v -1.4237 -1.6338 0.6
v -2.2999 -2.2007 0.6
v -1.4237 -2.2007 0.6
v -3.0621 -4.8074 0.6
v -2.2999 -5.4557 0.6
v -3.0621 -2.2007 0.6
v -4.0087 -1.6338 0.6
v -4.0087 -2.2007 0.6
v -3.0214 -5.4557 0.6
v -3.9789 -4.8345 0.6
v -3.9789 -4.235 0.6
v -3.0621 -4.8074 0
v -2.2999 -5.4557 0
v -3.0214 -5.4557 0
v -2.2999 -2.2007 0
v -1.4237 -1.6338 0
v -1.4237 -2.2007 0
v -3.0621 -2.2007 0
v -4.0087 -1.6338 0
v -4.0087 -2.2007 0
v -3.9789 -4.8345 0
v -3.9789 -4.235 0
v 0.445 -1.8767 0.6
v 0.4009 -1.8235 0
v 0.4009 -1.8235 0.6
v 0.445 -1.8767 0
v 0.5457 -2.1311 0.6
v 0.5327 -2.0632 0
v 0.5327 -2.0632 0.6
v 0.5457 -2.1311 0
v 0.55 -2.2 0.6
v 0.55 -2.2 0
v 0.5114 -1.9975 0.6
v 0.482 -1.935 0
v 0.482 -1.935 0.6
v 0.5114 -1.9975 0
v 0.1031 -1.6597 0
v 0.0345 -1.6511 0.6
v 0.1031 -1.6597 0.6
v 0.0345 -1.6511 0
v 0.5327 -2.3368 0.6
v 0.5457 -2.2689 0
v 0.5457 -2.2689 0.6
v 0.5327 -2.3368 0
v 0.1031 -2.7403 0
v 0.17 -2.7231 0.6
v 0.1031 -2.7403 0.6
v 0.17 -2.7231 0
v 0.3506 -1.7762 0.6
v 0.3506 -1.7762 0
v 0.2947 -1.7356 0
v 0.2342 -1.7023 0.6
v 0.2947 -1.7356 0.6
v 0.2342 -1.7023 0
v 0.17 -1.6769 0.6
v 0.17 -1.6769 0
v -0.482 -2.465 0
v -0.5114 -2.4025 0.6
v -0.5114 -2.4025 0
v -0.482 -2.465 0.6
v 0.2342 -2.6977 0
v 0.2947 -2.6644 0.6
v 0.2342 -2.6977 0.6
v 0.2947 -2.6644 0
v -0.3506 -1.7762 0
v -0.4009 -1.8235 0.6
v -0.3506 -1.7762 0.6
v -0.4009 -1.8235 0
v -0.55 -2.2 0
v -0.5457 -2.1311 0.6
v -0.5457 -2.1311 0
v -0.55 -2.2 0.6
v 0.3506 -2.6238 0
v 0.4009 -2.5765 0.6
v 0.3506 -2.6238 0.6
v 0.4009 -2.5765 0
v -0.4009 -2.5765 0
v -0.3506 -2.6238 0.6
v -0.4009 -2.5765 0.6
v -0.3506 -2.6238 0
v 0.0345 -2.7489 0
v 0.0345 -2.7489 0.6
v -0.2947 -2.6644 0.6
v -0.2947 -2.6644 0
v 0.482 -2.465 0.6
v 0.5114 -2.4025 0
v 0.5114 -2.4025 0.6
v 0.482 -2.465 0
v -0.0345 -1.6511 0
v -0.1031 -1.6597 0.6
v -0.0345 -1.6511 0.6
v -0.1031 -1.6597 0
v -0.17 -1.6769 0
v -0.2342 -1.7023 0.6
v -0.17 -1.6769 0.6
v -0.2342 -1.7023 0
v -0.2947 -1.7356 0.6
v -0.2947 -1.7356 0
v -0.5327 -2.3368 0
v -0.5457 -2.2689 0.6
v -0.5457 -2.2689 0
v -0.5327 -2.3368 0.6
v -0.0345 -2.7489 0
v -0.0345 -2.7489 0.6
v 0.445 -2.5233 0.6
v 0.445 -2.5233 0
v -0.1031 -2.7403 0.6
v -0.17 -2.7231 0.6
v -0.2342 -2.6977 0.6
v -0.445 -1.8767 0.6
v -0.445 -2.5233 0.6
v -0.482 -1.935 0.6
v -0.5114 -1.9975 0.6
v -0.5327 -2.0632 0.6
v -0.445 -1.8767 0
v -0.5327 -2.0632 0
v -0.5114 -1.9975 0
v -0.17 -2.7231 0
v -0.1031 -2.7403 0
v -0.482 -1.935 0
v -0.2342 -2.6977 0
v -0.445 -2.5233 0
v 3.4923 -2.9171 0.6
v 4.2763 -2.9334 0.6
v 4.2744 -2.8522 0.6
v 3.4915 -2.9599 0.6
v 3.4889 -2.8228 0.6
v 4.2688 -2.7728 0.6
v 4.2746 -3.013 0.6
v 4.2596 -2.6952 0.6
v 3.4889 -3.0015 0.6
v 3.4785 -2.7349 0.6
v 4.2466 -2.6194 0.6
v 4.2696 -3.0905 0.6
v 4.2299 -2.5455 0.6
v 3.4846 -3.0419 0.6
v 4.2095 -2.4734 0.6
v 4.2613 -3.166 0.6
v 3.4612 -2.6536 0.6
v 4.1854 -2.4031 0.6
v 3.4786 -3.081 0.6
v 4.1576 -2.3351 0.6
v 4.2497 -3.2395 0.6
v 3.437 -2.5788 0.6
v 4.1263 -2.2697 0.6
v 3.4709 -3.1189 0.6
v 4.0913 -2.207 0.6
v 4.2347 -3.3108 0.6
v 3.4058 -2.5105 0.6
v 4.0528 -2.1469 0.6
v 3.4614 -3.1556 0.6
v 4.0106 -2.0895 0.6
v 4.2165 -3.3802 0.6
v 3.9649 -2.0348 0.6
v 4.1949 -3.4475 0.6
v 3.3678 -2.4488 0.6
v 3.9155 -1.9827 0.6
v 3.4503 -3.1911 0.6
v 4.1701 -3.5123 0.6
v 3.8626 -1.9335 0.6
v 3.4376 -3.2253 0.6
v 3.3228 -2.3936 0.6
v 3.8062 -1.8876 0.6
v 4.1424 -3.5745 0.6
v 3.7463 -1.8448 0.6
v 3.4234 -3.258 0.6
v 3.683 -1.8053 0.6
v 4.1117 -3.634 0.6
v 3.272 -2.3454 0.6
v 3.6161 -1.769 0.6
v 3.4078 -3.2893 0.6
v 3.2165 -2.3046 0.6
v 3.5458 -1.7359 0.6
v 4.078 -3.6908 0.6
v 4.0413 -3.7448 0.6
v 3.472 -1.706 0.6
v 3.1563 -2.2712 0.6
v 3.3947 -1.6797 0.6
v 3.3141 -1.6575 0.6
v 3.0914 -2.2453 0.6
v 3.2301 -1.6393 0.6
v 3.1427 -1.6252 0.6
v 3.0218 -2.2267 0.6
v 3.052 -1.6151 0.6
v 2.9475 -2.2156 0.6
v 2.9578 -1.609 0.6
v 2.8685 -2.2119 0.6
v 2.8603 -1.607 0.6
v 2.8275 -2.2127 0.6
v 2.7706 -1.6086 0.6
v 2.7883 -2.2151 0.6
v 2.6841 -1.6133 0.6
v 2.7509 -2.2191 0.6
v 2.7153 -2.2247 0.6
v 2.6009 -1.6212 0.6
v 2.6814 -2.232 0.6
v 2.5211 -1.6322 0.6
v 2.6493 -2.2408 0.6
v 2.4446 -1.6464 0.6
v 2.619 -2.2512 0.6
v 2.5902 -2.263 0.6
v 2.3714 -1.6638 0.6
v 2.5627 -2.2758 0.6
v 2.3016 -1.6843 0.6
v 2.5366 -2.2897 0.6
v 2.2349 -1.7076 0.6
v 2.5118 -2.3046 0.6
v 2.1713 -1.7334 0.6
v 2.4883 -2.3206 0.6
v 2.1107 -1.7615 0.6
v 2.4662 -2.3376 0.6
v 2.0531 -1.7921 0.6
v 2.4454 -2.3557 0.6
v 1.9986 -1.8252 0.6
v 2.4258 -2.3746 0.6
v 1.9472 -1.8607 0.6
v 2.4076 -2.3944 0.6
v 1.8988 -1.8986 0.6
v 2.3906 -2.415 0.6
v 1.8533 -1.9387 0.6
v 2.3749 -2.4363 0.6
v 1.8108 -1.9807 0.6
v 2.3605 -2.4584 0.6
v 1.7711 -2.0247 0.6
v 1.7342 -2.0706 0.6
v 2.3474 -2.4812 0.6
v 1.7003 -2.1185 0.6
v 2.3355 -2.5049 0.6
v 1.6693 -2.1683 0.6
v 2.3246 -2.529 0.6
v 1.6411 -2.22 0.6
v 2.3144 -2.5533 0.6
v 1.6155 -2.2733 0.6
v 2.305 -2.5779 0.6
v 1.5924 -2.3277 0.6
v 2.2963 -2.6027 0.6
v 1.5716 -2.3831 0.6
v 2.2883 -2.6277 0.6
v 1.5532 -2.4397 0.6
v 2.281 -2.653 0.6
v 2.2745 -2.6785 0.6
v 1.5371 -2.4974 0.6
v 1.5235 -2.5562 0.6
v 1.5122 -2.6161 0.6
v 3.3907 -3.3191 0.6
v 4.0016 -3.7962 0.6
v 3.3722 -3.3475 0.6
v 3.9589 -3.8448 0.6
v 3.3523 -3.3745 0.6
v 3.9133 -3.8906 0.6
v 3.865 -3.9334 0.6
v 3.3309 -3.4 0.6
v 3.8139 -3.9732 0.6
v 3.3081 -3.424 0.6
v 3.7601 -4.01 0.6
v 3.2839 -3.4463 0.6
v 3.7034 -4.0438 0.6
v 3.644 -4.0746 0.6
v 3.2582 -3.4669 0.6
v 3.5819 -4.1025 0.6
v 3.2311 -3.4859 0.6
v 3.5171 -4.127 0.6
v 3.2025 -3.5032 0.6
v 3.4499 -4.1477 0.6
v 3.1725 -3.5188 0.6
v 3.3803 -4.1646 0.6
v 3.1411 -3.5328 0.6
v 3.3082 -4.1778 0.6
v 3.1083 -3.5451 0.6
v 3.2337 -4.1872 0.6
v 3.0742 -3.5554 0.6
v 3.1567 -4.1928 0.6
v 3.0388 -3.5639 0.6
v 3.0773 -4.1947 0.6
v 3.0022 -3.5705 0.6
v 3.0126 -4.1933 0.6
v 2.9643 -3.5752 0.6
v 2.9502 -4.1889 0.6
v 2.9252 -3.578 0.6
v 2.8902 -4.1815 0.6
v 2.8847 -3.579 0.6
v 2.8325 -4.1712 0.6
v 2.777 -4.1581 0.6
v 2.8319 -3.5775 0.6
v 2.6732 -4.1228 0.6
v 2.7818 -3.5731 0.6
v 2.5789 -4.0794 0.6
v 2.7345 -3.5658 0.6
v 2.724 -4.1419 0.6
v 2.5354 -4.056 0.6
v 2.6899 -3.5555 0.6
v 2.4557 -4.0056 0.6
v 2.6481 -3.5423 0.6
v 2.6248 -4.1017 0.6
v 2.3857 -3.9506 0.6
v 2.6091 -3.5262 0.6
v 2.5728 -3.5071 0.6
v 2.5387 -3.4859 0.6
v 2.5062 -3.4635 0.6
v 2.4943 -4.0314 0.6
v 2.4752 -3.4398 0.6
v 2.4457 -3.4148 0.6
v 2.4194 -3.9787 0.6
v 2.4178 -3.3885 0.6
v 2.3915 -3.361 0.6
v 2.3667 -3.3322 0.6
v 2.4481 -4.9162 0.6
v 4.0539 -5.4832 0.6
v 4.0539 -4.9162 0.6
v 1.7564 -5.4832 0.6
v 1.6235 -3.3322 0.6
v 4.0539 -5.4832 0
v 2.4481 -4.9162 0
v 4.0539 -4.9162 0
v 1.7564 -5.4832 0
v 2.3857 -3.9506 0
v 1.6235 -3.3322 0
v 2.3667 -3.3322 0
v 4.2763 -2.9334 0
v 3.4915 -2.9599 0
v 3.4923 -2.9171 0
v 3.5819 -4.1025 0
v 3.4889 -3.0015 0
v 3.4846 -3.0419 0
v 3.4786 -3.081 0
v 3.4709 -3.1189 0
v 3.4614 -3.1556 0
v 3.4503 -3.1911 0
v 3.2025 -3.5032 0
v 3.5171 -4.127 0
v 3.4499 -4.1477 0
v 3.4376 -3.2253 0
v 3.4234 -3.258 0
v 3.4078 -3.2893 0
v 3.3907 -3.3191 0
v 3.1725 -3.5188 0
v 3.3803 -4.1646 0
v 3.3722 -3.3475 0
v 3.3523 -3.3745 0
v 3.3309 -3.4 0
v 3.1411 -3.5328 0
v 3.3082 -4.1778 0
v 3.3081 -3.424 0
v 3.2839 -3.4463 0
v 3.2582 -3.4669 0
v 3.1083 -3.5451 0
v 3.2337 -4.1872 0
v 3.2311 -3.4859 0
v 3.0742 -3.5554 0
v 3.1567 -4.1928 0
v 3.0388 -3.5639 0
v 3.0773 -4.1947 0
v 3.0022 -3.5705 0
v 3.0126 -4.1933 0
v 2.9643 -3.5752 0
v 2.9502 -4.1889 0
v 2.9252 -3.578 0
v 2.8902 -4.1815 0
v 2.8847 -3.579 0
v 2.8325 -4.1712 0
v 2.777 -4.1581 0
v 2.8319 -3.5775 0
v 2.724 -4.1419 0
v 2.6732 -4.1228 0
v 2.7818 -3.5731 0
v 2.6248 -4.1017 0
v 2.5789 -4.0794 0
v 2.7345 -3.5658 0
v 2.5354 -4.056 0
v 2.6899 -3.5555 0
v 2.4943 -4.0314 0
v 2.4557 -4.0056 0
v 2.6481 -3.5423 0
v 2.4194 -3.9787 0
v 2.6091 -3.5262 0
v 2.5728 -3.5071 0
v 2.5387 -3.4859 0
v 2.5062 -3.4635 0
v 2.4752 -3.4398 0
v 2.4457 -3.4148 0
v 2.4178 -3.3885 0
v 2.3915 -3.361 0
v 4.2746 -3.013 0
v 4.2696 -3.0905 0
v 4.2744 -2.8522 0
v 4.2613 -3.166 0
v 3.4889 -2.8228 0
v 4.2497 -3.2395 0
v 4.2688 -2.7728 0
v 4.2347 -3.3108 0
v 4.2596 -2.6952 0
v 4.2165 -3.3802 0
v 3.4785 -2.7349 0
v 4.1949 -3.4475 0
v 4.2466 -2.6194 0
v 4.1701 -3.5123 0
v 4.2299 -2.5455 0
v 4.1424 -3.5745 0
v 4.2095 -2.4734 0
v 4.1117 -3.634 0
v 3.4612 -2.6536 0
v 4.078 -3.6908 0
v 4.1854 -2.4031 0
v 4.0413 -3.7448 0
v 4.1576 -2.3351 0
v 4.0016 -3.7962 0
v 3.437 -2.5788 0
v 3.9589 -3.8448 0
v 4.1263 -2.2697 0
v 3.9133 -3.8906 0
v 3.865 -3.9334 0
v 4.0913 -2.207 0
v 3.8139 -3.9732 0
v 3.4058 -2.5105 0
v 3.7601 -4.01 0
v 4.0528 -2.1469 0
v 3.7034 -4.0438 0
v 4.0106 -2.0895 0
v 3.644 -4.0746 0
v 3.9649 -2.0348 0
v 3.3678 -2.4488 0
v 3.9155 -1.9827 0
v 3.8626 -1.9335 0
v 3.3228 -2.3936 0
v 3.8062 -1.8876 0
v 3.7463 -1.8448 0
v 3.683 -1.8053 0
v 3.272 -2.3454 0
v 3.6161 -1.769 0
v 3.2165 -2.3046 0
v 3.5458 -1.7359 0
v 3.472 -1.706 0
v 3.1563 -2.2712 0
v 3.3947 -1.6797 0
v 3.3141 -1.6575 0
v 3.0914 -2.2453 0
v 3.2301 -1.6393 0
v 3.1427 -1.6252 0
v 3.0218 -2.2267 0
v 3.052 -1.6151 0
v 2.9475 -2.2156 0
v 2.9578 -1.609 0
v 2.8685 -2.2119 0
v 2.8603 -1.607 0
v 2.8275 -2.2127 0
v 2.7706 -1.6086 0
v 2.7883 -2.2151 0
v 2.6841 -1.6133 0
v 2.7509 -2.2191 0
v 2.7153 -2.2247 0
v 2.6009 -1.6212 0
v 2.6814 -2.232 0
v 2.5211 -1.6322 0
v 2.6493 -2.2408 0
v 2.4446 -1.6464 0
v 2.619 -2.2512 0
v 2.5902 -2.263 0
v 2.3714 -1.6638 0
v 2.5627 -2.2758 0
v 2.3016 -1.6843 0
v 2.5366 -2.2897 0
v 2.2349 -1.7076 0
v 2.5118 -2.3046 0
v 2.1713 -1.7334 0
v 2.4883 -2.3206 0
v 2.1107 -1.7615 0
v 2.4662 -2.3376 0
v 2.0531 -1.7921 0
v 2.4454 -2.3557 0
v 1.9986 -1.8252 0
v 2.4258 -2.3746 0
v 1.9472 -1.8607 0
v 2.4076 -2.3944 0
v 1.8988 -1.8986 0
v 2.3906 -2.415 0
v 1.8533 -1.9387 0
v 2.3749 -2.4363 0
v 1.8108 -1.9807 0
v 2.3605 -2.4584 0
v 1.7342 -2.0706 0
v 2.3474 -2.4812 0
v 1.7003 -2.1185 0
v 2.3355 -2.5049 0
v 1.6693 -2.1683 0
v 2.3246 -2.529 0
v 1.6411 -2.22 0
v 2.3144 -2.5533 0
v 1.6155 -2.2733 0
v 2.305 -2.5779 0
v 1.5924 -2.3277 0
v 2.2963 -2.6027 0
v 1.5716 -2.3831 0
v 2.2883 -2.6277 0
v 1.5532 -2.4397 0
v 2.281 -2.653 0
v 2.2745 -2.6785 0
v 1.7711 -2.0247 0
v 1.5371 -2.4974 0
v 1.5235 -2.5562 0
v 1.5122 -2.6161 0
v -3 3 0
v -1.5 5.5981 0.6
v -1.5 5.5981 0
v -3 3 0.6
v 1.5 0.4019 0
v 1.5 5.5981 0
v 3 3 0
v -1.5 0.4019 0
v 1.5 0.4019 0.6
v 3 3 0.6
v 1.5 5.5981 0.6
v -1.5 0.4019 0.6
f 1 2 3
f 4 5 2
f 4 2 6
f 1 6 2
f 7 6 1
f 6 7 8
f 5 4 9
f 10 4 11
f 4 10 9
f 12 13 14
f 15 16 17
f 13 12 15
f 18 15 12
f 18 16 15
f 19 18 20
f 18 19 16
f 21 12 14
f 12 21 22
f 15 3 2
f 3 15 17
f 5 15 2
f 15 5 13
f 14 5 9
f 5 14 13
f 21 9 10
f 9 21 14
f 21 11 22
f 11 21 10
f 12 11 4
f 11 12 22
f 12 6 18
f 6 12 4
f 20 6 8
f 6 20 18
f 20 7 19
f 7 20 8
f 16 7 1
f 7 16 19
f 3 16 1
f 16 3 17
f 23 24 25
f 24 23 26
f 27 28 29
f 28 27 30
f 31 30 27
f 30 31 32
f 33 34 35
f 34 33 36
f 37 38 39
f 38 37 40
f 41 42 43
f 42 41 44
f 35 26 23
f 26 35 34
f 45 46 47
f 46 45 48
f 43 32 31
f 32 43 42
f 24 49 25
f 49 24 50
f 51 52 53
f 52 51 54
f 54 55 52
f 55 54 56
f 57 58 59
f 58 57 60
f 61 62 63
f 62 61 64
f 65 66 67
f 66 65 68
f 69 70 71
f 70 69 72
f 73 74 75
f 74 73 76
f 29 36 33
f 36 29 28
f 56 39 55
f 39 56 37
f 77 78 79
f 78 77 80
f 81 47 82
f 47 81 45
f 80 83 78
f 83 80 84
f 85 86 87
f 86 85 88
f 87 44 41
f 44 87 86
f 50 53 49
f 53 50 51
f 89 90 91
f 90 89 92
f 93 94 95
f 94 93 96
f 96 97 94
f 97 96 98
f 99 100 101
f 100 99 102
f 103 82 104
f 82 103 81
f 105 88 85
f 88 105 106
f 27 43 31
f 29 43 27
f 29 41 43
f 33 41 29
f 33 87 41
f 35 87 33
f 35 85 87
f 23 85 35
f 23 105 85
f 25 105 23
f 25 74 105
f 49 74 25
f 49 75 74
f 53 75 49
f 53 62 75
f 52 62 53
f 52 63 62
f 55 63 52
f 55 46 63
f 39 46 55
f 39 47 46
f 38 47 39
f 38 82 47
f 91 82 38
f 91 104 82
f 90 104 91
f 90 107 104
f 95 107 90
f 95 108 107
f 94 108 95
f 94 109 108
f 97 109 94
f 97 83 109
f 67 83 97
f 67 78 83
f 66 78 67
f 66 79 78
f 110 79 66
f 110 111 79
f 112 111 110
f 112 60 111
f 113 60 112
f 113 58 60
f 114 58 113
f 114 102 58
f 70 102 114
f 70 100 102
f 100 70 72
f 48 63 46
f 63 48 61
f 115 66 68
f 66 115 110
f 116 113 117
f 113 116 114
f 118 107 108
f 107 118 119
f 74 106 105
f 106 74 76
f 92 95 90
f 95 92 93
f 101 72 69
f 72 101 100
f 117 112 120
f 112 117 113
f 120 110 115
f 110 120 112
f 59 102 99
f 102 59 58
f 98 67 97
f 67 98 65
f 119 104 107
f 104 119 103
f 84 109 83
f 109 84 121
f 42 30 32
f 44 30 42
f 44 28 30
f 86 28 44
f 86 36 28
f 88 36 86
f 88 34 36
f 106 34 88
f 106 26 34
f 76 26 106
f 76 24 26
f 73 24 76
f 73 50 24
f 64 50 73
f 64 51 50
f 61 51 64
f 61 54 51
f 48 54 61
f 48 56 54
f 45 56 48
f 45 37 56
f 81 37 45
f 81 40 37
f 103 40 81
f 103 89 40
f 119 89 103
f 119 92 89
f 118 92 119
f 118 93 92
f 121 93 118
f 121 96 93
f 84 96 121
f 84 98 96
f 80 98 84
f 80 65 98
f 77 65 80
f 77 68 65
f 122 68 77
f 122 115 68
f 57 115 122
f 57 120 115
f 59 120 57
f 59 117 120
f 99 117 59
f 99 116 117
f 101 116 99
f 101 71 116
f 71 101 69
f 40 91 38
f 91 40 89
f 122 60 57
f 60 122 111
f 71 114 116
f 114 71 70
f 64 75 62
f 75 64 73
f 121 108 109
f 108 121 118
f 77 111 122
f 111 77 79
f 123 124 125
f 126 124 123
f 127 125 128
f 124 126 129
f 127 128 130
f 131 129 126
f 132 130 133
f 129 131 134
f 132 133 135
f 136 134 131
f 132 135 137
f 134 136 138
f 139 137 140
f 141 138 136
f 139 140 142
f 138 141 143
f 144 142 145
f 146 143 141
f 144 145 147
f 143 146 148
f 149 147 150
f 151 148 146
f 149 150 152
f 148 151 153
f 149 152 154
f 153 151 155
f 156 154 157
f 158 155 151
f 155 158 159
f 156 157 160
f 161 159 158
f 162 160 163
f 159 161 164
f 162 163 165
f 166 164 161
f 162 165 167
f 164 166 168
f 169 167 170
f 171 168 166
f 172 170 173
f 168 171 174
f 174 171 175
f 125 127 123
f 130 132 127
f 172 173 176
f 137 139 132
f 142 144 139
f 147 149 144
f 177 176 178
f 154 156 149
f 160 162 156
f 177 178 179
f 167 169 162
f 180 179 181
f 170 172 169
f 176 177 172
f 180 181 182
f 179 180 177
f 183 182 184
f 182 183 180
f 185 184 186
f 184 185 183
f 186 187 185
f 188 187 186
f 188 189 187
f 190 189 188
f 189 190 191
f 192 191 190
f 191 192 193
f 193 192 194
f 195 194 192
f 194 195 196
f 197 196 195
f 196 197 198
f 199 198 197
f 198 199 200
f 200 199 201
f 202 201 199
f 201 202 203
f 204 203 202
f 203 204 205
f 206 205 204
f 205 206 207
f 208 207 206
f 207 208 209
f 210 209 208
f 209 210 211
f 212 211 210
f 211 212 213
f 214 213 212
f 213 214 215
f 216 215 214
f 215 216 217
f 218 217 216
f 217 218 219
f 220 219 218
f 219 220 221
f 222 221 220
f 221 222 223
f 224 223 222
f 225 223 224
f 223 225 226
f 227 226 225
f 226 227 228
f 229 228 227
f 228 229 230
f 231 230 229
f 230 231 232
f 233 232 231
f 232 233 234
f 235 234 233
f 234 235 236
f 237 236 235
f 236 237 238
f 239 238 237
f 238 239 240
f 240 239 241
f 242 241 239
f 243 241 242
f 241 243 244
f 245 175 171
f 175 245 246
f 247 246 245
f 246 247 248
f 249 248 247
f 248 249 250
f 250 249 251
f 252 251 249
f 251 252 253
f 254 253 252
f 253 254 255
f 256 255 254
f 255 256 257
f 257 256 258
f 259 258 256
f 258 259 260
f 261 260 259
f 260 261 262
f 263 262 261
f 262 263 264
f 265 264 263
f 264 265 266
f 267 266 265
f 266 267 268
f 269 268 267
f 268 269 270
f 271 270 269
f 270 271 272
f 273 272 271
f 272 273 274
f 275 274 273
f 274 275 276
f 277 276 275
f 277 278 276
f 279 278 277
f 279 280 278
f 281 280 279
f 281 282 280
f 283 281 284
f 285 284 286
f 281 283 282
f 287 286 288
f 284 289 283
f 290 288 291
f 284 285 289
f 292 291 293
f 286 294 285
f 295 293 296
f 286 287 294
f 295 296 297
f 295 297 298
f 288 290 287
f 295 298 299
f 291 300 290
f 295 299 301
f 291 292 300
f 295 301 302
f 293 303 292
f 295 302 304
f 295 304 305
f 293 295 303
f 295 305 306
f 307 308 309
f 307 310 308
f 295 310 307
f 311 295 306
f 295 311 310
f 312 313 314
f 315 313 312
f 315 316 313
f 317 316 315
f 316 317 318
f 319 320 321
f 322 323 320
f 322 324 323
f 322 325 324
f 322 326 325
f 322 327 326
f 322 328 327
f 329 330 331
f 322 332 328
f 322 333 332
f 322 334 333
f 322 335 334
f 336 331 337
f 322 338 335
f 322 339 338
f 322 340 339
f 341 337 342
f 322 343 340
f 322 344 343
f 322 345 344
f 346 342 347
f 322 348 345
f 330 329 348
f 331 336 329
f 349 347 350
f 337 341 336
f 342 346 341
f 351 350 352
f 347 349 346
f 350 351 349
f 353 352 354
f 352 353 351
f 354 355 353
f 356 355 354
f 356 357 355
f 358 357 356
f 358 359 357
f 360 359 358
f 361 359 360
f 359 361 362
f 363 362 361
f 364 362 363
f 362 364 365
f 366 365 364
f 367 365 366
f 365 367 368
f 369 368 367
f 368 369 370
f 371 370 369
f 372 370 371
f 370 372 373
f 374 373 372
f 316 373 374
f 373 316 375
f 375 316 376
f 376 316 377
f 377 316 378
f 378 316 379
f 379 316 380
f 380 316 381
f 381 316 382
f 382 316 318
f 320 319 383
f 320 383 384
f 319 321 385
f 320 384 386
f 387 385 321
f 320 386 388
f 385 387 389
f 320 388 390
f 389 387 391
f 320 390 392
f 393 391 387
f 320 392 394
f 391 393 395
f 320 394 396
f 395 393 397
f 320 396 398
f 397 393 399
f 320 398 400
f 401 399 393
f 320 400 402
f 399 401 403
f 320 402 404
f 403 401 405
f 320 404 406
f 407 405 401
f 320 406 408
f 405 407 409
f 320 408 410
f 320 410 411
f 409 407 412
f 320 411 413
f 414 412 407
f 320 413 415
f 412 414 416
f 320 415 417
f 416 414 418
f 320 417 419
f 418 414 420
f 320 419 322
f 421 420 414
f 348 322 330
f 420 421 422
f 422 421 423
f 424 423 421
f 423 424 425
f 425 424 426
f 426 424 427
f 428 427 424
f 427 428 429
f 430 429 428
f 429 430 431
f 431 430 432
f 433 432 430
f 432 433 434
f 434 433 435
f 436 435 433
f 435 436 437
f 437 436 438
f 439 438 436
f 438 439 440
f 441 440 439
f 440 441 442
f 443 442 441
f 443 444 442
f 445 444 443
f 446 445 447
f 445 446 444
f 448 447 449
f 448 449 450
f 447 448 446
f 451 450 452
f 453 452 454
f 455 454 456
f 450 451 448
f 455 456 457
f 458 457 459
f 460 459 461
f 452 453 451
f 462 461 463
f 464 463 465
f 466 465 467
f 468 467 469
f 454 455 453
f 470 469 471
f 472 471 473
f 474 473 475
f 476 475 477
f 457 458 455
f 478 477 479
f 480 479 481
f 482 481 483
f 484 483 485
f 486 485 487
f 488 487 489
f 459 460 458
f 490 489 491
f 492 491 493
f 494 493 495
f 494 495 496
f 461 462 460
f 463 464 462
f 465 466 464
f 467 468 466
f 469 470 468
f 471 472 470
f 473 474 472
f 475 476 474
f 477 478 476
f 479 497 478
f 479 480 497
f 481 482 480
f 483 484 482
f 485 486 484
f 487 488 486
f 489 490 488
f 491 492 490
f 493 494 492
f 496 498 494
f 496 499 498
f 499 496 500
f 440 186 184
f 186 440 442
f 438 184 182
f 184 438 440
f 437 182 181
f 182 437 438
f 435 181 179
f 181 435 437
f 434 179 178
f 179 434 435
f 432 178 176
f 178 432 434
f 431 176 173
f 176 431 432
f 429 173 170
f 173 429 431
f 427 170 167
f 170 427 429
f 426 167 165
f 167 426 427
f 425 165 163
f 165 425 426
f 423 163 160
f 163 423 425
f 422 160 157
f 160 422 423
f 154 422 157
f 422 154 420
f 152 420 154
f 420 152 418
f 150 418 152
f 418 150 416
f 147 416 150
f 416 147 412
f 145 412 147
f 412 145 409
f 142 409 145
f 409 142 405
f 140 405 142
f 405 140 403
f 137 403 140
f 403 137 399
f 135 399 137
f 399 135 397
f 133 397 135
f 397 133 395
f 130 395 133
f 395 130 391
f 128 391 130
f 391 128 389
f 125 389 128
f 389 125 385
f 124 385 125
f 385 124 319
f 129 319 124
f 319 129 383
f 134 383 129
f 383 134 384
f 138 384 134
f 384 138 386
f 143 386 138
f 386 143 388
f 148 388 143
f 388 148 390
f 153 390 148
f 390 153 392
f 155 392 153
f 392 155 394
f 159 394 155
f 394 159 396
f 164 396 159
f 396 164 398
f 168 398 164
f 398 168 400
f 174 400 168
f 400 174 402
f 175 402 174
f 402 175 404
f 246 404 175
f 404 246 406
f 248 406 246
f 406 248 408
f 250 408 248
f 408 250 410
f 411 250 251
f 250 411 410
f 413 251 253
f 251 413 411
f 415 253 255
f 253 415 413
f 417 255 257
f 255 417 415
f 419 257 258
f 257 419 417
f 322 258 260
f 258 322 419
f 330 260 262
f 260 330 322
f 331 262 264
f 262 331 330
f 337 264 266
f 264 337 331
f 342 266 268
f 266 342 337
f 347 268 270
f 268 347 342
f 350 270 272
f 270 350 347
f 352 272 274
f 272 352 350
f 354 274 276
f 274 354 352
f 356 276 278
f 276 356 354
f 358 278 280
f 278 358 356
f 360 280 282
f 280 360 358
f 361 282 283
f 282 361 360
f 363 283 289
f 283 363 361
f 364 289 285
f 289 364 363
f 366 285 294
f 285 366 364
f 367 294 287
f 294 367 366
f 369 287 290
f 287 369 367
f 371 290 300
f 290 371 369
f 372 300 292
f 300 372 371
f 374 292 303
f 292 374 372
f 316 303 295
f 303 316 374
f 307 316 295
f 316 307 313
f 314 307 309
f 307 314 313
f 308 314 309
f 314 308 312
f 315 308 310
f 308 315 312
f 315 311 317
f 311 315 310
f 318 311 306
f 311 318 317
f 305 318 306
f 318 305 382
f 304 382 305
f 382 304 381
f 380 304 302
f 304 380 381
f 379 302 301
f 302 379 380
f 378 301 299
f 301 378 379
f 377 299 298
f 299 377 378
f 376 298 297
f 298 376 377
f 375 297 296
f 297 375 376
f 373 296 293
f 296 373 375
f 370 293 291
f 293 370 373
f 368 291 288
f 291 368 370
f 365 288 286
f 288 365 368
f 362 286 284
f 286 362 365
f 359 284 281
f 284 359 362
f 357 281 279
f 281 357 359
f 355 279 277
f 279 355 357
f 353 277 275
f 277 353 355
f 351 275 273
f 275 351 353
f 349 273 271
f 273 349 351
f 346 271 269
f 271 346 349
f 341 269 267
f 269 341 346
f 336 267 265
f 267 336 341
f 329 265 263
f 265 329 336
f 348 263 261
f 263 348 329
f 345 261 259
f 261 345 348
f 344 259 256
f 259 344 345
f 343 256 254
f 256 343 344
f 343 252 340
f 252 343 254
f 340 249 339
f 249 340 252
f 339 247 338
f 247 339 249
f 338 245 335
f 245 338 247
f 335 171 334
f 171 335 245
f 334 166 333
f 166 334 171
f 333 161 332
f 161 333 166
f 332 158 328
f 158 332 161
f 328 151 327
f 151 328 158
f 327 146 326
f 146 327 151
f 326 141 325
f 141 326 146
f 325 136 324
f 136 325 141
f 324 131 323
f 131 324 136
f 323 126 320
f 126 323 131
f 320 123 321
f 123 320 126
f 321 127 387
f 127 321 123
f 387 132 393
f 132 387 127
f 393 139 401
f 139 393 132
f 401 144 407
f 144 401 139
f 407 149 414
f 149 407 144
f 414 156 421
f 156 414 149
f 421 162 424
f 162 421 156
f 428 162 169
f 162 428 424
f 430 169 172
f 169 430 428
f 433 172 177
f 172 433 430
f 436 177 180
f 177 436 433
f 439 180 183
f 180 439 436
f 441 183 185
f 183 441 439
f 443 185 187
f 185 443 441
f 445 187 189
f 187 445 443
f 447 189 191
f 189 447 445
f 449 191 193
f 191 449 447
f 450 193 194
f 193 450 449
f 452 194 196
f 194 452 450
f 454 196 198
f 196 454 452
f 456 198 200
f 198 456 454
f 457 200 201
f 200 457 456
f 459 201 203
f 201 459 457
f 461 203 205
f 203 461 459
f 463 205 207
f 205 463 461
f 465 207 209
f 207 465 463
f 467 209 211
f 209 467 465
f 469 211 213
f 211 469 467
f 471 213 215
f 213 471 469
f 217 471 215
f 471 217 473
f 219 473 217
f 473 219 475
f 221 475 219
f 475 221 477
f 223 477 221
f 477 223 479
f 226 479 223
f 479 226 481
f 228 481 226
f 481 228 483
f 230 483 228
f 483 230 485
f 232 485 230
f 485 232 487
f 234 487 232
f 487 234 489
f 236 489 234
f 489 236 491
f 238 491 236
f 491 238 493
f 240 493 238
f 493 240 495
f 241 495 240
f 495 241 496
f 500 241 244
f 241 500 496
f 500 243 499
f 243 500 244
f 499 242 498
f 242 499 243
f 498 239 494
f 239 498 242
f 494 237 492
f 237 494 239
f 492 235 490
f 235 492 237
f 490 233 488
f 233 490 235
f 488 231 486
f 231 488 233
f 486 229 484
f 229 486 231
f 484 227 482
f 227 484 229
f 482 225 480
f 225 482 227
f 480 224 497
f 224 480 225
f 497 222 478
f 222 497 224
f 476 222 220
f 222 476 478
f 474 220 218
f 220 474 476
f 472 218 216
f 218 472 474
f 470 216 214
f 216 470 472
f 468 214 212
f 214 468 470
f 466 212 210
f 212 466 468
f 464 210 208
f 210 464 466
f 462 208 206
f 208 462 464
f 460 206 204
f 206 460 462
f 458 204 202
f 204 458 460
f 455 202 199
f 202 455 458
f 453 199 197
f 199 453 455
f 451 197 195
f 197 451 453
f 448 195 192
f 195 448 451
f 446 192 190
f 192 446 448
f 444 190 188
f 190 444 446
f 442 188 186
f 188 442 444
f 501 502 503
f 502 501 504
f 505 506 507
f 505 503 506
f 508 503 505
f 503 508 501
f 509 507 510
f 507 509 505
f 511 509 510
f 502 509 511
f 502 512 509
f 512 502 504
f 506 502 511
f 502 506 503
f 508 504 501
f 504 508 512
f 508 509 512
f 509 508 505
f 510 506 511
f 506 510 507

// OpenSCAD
$fn = 50;

difference() {
	union() {
		translate(v = [-2.85, -3.5, 0.6]) {
			rotate(a = [180, 0, 0]) {
				linear_extrude(height = 0.6) {
					text(font = "Liberation Sans:style=Bold", halign = "center", size = 4.0, text = "1", valign = "center");
				}
			}
		}
		translate(v = [0.0, -2.2, 0.0]) {
			cylinder(h = 0.6, r = 0.55);
		}
		translate(v = [2.85, -3.5, 0.6]) {
			rotate(a = [180, 0, 0]) {
				linear_extrude(height = 0.6) {
					text(font = "Liberation Sans:style=Bold", halign = "center", size = 4.0, text = "5", valign = "center");
				}
			}
		}
		translate(v = [0, 3, 0]) {
			linear_extrude(height = 0.6) {
				polygon(points = [[3.0, 0.0], [1.5000000000000004, 2.598076211353316], [-1.4999999999999993, 2.598076211353316], [-3.0, 3.6739403974420594e-16], [-1.5000000000000013, -2.5980762113533156], [1.499999999999998, -2.598076211353317]]);
			}
		}
	}
	union();
}
